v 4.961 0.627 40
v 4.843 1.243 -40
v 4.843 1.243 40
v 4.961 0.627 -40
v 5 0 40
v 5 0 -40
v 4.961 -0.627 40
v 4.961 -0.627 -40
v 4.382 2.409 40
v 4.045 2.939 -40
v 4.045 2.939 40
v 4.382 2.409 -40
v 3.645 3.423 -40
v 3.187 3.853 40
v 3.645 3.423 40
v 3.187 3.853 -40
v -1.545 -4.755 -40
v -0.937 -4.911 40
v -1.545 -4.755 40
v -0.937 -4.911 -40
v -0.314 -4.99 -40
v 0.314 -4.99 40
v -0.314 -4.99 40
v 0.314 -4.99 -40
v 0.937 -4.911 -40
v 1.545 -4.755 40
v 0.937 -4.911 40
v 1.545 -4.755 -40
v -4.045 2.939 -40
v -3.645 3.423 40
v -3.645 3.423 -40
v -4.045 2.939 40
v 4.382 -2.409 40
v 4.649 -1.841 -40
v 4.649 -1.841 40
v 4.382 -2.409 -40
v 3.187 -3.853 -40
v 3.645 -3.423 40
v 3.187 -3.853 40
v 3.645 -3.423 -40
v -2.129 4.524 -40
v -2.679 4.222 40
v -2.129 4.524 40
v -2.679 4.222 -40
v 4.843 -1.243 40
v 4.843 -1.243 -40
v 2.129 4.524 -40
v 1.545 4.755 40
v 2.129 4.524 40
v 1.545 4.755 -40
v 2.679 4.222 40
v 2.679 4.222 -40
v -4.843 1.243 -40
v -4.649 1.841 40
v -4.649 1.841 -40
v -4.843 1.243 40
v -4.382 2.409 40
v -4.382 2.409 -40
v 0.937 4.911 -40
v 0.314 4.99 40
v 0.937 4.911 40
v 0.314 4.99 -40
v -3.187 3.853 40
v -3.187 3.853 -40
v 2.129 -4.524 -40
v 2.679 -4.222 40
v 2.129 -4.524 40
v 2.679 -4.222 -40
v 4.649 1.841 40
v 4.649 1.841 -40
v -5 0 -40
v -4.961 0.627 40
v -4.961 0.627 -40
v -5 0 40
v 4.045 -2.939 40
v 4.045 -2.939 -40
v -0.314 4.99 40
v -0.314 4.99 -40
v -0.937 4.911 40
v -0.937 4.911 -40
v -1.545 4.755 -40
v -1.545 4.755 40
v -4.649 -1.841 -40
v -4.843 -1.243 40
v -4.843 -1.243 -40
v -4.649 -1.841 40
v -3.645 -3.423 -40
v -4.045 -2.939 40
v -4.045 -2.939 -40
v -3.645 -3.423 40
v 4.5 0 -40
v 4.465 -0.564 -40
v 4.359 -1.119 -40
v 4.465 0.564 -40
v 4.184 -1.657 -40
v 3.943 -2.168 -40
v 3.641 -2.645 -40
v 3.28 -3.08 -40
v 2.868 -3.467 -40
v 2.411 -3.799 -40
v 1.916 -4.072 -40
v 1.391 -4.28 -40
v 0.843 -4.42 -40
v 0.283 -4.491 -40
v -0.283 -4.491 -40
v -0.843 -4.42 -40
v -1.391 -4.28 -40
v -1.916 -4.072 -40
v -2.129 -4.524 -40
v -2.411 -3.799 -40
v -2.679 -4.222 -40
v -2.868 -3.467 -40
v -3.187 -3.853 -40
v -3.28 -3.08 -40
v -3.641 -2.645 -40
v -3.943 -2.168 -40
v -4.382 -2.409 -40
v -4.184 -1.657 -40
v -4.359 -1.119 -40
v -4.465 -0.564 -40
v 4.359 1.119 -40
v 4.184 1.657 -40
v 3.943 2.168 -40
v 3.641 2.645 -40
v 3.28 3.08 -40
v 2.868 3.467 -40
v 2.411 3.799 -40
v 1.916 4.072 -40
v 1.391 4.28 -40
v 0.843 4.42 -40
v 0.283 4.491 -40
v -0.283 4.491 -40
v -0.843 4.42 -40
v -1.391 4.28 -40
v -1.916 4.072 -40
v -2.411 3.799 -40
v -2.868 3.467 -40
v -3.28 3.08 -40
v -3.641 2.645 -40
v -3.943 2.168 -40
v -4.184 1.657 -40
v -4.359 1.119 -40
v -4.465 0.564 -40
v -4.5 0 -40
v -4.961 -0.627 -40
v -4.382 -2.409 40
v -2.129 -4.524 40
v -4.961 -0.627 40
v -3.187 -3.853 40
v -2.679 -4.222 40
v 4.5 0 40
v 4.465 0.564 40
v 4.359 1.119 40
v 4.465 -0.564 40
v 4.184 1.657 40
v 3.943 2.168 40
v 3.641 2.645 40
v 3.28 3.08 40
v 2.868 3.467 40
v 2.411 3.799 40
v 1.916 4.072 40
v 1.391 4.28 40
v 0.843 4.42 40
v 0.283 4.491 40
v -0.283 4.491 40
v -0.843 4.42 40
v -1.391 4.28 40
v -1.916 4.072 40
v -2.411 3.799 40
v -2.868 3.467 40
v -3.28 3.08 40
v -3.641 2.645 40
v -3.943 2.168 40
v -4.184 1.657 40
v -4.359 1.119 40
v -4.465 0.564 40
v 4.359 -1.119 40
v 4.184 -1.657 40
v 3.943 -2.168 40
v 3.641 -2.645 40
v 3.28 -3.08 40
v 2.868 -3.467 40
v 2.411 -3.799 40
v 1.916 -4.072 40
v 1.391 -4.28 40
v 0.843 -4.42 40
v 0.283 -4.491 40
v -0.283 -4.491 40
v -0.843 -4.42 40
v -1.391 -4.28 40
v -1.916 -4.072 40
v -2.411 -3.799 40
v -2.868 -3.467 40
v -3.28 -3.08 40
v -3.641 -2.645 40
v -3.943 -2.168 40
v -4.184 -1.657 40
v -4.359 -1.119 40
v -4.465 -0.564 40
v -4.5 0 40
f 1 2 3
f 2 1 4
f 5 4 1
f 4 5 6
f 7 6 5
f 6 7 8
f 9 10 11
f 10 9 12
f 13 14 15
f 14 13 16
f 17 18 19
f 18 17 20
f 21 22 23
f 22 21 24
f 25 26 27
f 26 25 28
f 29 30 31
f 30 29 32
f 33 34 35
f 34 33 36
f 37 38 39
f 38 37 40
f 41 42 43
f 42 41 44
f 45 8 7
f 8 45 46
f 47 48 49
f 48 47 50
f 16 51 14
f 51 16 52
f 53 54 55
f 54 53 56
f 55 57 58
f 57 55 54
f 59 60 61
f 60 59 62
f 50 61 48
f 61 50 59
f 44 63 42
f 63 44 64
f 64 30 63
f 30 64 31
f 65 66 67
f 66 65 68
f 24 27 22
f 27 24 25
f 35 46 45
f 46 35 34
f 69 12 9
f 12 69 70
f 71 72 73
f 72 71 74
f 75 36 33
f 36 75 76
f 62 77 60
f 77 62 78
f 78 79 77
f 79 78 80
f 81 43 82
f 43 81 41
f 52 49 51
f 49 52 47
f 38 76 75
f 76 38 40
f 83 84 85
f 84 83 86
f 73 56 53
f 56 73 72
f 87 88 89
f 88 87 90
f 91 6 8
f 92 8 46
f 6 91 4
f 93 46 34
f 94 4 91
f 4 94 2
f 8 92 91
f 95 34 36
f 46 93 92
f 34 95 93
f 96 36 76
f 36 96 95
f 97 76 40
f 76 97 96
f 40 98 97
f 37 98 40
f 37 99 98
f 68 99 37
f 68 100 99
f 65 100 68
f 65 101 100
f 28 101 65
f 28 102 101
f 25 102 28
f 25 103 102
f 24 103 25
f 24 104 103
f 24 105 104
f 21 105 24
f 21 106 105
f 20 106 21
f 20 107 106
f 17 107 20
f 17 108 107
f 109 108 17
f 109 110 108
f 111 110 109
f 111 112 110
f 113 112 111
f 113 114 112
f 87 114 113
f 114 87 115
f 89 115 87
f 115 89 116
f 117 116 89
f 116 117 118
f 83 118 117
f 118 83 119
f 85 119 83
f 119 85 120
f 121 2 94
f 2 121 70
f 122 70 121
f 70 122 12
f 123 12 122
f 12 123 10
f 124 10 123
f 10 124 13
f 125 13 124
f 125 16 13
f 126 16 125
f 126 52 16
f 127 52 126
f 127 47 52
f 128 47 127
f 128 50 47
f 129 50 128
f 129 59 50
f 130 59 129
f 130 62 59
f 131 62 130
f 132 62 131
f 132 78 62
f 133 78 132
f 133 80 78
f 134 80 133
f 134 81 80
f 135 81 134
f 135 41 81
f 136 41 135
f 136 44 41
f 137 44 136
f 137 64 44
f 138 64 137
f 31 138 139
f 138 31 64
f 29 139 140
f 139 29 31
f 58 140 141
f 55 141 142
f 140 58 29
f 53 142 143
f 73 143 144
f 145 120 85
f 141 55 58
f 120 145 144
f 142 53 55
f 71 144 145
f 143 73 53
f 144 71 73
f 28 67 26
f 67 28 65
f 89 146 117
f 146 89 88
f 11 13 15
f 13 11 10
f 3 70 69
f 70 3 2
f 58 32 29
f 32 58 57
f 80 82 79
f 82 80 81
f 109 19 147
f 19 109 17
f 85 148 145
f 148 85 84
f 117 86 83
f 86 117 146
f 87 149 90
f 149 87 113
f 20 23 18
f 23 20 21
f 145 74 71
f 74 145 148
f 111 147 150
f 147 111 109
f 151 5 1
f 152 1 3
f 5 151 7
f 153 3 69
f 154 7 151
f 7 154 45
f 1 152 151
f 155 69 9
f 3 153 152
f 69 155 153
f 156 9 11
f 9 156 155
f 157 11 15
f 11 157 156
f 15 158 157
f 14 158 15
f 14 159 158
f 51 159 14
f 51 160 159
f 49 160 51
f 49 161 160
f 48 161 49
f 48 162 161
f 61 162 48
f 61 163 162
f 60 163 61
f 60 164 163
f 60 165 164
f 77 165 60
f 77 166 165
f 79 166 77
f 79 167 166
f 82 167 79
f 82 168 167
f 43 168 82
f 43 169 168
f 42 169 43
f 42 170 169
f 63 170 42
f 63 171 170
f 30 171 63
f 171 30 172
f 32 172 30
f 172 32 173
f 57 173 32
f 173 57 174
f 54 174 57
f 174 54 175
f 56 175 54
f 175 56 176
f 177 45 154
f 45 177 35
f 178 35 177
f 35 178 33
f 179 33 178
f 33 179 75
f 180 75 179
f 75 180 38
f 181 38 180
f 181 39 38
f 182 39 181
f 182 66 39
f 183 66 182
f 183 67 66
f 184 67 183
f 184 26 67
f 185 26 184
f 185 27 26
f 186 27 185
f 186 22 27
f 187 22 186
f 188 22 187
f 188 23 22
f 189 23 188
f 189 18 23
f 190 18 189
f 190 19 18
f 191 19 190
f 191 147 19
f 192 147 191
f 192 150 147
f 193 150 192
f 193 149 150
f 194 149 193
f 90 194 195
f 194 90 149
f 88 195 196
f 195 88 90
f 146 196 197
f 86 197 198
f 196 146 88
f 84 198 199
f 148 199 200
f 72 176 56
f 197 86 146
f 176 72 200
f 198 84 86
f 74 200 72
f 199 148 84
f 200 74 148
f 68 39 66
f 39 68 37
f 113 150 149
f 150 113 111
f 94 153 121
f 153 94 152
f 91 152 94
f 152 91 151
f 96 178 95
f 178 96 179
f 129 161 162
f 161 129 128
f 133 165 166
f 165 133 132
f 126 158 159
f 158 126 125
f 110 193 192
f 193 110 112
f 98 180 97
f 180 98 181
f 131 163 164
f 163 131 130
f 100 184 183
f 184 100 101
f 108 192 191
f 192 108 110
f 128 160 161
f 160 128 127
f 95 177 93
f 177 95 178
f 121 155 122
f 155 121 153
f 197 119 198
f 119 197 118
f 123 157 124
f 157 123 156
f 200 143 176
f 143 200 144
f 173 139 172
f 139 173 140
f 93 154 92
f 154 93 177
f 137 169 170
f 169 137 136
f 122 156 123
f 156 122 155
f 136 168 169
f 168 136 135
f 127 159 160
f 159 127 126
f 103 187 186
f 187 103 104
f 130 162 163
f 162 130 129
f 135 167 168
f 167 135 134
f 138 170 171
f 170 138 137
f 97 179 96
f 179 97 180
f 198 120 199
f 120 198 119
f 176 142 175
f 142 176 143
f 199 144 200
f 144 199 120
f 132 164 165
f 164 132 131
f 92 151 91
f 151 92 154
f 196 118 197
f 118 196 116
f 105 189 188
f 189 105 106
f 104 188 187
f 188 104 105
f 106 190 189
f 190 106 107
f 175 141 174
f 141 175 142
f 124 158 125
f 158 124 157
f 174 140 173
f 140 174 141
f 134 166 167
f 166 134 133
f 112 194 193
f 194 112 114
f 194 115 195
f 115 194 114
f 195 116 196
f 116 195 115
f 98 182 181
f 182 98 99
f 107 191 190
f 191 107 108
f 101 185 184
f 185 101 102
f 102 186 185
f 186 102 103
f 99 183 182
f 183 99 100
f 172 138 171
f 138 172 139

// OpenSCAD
$fn = 50;


difference() {
	union() {
		translate(v = [0, 0, -40.0000000000]) {
			cylinder(h = 80, r = 5.0000000000);
		}
	}
	union() {
		translate(v = [0, 0, -100.0000000000]) {
			cylinder(h = 200, r = 4.5000000000);
		}
	}
}
